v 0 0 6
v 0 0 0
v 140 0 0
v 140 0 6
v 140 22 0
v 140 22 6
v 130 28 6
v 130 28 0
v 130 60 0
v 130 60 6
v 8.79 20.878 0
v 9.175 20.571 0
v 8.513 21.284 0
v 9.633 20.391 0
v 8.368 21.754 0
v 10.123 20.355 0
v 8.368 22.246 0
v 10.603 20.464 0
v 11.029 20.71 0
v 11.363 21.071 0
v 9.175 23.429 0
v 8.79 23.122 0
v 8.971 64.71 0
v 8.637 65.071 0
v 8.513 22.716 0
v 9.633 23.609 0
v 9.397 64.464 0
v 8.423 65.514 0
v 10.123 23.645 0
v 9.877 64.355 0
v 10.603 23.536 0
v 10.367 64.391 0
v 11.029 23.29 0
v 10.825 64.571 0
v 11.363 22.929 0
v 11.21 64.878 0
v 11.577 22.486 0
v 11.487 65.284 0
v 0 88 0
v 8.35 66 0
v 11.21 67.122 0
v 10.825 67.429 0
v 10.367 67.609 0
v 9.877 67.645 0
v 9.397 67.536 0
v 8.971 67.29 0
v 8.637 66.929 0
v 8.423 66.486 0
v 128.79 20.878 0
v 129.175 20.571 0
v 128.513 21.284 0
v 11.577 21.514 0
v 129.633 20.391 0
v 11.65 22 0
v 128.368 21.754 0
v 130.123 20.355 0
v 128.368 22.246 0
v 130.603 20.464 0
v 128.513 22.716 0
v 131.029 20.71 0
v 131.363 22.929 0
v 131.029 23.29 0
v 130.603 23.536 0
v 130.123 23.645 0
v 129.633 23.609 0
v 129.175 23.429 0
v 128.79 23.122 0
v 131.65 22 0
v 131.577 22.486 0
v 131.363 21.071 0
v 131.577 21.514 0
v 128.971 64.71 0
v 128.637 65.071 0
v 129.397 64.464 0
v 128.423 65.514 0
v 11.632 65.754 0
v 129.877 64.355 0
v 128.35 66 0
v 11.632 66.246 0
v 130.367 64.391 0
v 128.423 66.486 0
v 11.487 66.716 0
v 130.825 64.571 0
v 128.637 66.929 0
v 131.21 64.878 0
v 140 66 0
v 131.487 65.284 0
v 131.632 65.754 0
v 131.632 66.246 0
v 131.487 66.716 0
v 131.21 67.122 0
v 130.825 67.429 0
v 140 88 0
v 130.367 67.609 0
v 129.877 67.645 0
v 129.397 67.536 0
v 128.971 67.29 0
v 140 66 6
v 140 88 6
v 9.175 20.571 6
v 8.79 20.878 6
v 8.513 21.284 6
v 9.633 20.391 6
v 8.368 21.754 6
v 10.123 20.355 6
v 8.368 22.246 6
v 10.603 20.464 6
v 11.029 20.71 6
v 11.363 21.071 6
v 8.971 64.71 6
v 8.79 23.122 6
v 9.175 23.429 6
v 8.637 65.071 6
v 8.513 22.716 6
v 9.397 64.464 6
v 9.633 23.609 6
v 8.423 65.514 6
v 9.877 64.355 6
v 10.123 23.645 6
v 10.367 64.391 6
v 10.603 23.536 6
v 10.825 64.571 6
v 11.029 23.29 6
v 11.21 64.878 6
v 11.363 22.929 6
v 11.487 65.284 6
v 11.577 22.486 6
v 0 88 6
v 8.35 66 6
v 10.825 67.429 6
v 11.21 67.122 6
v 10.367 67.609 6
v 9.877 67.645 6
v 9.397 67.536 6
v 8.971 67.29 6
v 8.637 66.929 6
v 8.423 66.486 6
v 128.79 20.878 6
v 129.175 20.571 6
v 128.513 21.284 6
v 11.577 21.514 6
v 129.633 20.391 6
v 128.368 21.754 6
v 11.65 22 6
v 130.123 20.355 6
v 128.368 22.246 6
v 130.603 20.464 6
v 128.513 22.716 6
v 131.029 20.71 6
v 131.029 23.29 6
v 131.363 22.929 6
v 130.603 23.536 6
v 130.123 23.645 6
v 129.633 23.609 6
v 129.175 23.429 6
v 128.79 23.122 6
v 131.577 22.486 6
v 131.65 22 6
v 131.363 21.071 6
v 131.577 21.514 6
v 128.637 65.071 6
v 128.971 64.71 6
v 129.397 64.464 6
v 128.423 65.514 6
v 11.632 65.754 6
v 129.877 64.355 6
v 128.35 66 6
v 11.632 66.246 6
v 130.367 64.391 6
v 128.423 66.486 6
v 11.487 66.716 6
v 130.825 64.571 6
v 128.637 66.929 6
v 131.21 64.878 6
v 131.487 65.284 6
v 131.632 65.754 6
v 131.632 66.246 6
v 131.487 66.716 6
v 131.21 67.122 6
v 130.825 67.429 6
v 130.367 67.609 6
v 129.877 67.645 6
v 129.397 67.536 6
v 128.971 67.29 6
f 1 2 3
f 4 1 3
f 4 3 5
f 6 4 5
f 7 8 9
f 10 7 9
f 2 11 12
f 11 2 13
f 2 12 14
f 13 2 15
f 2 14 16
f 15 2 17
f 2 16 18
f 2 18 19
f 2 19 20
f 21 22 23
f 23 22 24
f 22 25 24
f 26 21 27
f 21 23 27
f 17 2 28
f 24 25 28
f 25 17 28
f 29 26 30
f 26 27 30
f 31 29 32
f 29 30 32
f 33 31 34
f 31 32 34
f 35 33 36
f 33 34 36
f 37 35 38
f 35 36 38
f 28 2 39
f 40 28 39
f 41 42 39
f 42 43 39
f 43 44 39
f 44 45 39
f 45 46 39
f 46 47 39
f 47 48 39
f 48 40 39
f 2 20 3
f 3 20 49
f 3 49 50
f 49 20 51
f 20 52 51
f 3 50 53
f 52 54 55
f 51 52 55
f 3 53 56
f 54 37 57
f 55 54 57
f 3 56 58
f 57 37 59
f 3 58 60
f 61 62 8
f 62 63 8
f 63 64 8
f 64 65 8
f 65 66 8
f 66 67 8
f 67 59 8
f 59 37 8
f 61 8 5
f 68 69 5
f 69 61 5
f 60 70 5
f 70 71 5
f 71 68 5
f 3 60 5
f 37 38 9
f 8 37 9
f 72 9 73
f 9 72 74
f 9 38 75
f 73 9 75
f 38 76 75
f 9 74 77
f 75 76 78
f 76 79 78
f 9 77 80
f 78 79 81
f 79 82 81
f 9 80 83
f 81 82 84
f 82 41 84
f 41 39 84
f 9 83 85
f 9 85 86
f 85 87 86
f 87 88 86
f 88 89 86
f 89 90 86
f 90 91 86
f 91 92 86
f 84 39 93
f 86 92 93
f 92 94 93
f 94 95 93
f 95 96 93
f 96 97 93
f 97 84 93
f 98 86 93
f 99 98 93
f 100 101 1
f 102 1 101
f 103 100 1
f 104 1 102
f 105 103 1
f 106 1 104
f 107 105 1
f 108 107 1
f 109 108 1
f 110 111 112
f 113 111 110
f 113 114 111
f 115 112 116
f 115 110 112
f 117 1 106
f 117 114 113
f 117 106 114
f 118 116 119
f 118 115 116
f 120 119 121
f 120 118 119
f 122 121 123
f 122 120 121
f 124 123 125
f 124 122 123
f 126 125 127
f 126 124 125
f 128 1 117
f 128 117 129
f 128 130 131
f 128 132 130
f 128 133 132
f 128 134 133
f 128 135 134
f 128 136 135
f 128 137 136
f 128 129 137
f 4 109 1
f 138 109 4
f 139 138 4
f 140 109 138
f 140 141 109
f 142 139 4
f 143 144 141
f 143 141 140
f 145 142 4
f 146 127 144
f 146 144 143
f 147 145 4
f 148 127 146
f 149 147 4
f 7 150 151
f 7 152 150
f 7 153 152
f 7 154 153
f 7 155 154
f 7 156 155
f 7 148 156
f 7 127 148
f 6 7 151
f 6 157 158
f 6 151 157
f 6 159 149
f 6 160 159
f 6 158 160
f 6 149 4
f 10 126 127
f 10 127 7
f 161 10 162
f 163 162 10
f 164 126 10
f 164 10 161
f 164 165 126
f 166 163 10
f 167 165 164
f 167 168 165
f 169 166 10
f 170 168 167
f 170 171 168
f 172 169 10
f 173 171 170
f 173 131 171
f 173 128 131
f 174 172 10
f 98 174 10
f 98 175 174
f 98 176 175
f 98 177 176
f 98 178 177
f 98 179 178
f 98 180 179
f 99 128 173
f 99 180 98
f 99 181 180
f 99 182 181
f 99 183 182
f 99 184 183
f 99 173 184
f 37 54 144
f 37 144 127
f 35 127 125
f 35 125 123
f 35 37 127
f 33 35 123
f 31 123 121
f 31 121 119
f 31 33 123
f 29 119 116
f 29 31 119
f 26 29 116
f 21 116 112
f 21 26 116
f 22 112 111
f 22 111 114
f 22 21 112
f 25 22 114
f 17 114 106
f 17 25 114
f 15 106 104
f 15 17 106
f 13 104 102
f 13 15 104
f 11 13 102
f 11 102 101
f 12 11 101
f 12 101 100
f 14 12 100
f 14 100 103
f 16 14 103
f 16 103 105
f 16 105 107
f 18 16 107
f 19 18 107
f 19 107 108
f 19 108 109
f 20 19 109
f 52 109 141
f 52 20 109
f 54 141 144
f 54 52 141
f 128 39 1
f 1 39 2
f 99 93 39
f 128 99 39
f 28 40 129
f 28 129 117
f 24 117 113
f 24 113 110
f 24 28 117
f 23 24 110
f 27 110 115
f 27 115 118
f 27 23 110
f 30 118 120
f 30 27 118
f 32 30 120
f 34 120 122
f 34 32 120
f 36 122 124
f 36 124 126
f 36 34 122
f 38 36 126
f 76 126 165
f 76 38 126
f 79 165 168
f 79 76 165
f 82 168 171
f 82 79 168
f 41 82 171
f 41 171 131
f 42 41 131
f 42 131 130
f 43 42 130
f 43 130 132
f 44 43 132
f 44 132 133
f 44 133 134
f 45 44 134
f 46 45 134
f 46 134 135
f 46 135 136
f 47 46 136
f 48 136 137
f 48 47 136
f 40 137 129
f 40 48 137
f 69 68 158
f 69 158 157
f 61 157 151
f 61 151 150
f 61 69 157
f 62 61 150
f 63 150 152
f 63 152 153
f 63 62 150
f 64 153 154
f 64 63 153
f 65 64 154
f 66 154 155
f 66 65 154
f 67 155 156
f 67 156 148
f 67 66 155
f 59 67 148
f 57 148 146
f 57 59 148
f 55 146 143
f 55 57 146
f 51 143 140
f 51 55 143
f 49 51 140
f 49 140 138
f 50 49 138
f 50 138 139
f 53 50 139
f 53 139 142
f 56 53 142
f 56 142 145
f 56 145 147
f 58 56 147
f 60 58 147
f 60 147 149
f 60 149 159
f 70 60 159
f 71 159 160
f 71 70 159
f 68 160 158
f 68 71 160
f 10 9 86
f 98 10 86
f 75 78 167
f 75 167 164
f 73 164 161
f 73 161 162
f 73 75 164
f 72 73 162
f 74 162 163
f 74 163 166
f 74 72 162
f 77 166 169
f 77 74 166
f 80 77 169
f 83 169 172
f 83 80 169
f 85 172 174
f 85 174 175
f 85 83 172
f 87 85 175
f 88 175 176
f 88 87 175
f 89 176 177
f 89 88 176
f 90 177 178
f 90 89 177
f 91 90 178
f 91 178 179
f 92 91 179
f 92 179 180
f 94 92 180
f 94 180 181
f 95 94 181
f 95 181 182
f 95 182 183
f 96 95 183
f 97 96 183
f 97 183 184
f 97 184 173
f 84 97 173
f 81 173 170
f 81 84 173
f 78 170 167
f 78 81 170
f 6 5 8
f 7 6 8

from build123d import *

# Parameters (mm, degrees)
SKETCH1_R           = 1.65
BOSS_EXTRUDE1_DEPTH = 6


with BuildPart() as part:
    # Sketch1 → Boss-Extrude1 (new body)
    with BuildSketch(Plane.XY):
        Polygon((0, 0), (140, 1.2e-05), (139.99998, 22.000012), (130, 28), (130, 60), (139.99998, 65.999988), (140, 87.999988), (0, 88), align=None)
        with Locations((10, 22)):
            Circle(SKETCH1_R, mode=Mode.SUBTRACT)
        with Locations(Location((130, 66, 0), (0, 0, 180))):
            Circle(SKETCH1_R, mode=Mode.SUBTRACT)
        with Locations((130, 22)):
            Circle(SKETCH1_R, mode=Mode.SUBTRACT)
        with Locations(Location((10, 66, 0), (0, 0, 180))):
            Circle(SKETCH1_R, mode=Mode.SUBTRACT)
    extrude(amount=BOSS_EXTRUDE1_DEPTH)


solid = part.part
